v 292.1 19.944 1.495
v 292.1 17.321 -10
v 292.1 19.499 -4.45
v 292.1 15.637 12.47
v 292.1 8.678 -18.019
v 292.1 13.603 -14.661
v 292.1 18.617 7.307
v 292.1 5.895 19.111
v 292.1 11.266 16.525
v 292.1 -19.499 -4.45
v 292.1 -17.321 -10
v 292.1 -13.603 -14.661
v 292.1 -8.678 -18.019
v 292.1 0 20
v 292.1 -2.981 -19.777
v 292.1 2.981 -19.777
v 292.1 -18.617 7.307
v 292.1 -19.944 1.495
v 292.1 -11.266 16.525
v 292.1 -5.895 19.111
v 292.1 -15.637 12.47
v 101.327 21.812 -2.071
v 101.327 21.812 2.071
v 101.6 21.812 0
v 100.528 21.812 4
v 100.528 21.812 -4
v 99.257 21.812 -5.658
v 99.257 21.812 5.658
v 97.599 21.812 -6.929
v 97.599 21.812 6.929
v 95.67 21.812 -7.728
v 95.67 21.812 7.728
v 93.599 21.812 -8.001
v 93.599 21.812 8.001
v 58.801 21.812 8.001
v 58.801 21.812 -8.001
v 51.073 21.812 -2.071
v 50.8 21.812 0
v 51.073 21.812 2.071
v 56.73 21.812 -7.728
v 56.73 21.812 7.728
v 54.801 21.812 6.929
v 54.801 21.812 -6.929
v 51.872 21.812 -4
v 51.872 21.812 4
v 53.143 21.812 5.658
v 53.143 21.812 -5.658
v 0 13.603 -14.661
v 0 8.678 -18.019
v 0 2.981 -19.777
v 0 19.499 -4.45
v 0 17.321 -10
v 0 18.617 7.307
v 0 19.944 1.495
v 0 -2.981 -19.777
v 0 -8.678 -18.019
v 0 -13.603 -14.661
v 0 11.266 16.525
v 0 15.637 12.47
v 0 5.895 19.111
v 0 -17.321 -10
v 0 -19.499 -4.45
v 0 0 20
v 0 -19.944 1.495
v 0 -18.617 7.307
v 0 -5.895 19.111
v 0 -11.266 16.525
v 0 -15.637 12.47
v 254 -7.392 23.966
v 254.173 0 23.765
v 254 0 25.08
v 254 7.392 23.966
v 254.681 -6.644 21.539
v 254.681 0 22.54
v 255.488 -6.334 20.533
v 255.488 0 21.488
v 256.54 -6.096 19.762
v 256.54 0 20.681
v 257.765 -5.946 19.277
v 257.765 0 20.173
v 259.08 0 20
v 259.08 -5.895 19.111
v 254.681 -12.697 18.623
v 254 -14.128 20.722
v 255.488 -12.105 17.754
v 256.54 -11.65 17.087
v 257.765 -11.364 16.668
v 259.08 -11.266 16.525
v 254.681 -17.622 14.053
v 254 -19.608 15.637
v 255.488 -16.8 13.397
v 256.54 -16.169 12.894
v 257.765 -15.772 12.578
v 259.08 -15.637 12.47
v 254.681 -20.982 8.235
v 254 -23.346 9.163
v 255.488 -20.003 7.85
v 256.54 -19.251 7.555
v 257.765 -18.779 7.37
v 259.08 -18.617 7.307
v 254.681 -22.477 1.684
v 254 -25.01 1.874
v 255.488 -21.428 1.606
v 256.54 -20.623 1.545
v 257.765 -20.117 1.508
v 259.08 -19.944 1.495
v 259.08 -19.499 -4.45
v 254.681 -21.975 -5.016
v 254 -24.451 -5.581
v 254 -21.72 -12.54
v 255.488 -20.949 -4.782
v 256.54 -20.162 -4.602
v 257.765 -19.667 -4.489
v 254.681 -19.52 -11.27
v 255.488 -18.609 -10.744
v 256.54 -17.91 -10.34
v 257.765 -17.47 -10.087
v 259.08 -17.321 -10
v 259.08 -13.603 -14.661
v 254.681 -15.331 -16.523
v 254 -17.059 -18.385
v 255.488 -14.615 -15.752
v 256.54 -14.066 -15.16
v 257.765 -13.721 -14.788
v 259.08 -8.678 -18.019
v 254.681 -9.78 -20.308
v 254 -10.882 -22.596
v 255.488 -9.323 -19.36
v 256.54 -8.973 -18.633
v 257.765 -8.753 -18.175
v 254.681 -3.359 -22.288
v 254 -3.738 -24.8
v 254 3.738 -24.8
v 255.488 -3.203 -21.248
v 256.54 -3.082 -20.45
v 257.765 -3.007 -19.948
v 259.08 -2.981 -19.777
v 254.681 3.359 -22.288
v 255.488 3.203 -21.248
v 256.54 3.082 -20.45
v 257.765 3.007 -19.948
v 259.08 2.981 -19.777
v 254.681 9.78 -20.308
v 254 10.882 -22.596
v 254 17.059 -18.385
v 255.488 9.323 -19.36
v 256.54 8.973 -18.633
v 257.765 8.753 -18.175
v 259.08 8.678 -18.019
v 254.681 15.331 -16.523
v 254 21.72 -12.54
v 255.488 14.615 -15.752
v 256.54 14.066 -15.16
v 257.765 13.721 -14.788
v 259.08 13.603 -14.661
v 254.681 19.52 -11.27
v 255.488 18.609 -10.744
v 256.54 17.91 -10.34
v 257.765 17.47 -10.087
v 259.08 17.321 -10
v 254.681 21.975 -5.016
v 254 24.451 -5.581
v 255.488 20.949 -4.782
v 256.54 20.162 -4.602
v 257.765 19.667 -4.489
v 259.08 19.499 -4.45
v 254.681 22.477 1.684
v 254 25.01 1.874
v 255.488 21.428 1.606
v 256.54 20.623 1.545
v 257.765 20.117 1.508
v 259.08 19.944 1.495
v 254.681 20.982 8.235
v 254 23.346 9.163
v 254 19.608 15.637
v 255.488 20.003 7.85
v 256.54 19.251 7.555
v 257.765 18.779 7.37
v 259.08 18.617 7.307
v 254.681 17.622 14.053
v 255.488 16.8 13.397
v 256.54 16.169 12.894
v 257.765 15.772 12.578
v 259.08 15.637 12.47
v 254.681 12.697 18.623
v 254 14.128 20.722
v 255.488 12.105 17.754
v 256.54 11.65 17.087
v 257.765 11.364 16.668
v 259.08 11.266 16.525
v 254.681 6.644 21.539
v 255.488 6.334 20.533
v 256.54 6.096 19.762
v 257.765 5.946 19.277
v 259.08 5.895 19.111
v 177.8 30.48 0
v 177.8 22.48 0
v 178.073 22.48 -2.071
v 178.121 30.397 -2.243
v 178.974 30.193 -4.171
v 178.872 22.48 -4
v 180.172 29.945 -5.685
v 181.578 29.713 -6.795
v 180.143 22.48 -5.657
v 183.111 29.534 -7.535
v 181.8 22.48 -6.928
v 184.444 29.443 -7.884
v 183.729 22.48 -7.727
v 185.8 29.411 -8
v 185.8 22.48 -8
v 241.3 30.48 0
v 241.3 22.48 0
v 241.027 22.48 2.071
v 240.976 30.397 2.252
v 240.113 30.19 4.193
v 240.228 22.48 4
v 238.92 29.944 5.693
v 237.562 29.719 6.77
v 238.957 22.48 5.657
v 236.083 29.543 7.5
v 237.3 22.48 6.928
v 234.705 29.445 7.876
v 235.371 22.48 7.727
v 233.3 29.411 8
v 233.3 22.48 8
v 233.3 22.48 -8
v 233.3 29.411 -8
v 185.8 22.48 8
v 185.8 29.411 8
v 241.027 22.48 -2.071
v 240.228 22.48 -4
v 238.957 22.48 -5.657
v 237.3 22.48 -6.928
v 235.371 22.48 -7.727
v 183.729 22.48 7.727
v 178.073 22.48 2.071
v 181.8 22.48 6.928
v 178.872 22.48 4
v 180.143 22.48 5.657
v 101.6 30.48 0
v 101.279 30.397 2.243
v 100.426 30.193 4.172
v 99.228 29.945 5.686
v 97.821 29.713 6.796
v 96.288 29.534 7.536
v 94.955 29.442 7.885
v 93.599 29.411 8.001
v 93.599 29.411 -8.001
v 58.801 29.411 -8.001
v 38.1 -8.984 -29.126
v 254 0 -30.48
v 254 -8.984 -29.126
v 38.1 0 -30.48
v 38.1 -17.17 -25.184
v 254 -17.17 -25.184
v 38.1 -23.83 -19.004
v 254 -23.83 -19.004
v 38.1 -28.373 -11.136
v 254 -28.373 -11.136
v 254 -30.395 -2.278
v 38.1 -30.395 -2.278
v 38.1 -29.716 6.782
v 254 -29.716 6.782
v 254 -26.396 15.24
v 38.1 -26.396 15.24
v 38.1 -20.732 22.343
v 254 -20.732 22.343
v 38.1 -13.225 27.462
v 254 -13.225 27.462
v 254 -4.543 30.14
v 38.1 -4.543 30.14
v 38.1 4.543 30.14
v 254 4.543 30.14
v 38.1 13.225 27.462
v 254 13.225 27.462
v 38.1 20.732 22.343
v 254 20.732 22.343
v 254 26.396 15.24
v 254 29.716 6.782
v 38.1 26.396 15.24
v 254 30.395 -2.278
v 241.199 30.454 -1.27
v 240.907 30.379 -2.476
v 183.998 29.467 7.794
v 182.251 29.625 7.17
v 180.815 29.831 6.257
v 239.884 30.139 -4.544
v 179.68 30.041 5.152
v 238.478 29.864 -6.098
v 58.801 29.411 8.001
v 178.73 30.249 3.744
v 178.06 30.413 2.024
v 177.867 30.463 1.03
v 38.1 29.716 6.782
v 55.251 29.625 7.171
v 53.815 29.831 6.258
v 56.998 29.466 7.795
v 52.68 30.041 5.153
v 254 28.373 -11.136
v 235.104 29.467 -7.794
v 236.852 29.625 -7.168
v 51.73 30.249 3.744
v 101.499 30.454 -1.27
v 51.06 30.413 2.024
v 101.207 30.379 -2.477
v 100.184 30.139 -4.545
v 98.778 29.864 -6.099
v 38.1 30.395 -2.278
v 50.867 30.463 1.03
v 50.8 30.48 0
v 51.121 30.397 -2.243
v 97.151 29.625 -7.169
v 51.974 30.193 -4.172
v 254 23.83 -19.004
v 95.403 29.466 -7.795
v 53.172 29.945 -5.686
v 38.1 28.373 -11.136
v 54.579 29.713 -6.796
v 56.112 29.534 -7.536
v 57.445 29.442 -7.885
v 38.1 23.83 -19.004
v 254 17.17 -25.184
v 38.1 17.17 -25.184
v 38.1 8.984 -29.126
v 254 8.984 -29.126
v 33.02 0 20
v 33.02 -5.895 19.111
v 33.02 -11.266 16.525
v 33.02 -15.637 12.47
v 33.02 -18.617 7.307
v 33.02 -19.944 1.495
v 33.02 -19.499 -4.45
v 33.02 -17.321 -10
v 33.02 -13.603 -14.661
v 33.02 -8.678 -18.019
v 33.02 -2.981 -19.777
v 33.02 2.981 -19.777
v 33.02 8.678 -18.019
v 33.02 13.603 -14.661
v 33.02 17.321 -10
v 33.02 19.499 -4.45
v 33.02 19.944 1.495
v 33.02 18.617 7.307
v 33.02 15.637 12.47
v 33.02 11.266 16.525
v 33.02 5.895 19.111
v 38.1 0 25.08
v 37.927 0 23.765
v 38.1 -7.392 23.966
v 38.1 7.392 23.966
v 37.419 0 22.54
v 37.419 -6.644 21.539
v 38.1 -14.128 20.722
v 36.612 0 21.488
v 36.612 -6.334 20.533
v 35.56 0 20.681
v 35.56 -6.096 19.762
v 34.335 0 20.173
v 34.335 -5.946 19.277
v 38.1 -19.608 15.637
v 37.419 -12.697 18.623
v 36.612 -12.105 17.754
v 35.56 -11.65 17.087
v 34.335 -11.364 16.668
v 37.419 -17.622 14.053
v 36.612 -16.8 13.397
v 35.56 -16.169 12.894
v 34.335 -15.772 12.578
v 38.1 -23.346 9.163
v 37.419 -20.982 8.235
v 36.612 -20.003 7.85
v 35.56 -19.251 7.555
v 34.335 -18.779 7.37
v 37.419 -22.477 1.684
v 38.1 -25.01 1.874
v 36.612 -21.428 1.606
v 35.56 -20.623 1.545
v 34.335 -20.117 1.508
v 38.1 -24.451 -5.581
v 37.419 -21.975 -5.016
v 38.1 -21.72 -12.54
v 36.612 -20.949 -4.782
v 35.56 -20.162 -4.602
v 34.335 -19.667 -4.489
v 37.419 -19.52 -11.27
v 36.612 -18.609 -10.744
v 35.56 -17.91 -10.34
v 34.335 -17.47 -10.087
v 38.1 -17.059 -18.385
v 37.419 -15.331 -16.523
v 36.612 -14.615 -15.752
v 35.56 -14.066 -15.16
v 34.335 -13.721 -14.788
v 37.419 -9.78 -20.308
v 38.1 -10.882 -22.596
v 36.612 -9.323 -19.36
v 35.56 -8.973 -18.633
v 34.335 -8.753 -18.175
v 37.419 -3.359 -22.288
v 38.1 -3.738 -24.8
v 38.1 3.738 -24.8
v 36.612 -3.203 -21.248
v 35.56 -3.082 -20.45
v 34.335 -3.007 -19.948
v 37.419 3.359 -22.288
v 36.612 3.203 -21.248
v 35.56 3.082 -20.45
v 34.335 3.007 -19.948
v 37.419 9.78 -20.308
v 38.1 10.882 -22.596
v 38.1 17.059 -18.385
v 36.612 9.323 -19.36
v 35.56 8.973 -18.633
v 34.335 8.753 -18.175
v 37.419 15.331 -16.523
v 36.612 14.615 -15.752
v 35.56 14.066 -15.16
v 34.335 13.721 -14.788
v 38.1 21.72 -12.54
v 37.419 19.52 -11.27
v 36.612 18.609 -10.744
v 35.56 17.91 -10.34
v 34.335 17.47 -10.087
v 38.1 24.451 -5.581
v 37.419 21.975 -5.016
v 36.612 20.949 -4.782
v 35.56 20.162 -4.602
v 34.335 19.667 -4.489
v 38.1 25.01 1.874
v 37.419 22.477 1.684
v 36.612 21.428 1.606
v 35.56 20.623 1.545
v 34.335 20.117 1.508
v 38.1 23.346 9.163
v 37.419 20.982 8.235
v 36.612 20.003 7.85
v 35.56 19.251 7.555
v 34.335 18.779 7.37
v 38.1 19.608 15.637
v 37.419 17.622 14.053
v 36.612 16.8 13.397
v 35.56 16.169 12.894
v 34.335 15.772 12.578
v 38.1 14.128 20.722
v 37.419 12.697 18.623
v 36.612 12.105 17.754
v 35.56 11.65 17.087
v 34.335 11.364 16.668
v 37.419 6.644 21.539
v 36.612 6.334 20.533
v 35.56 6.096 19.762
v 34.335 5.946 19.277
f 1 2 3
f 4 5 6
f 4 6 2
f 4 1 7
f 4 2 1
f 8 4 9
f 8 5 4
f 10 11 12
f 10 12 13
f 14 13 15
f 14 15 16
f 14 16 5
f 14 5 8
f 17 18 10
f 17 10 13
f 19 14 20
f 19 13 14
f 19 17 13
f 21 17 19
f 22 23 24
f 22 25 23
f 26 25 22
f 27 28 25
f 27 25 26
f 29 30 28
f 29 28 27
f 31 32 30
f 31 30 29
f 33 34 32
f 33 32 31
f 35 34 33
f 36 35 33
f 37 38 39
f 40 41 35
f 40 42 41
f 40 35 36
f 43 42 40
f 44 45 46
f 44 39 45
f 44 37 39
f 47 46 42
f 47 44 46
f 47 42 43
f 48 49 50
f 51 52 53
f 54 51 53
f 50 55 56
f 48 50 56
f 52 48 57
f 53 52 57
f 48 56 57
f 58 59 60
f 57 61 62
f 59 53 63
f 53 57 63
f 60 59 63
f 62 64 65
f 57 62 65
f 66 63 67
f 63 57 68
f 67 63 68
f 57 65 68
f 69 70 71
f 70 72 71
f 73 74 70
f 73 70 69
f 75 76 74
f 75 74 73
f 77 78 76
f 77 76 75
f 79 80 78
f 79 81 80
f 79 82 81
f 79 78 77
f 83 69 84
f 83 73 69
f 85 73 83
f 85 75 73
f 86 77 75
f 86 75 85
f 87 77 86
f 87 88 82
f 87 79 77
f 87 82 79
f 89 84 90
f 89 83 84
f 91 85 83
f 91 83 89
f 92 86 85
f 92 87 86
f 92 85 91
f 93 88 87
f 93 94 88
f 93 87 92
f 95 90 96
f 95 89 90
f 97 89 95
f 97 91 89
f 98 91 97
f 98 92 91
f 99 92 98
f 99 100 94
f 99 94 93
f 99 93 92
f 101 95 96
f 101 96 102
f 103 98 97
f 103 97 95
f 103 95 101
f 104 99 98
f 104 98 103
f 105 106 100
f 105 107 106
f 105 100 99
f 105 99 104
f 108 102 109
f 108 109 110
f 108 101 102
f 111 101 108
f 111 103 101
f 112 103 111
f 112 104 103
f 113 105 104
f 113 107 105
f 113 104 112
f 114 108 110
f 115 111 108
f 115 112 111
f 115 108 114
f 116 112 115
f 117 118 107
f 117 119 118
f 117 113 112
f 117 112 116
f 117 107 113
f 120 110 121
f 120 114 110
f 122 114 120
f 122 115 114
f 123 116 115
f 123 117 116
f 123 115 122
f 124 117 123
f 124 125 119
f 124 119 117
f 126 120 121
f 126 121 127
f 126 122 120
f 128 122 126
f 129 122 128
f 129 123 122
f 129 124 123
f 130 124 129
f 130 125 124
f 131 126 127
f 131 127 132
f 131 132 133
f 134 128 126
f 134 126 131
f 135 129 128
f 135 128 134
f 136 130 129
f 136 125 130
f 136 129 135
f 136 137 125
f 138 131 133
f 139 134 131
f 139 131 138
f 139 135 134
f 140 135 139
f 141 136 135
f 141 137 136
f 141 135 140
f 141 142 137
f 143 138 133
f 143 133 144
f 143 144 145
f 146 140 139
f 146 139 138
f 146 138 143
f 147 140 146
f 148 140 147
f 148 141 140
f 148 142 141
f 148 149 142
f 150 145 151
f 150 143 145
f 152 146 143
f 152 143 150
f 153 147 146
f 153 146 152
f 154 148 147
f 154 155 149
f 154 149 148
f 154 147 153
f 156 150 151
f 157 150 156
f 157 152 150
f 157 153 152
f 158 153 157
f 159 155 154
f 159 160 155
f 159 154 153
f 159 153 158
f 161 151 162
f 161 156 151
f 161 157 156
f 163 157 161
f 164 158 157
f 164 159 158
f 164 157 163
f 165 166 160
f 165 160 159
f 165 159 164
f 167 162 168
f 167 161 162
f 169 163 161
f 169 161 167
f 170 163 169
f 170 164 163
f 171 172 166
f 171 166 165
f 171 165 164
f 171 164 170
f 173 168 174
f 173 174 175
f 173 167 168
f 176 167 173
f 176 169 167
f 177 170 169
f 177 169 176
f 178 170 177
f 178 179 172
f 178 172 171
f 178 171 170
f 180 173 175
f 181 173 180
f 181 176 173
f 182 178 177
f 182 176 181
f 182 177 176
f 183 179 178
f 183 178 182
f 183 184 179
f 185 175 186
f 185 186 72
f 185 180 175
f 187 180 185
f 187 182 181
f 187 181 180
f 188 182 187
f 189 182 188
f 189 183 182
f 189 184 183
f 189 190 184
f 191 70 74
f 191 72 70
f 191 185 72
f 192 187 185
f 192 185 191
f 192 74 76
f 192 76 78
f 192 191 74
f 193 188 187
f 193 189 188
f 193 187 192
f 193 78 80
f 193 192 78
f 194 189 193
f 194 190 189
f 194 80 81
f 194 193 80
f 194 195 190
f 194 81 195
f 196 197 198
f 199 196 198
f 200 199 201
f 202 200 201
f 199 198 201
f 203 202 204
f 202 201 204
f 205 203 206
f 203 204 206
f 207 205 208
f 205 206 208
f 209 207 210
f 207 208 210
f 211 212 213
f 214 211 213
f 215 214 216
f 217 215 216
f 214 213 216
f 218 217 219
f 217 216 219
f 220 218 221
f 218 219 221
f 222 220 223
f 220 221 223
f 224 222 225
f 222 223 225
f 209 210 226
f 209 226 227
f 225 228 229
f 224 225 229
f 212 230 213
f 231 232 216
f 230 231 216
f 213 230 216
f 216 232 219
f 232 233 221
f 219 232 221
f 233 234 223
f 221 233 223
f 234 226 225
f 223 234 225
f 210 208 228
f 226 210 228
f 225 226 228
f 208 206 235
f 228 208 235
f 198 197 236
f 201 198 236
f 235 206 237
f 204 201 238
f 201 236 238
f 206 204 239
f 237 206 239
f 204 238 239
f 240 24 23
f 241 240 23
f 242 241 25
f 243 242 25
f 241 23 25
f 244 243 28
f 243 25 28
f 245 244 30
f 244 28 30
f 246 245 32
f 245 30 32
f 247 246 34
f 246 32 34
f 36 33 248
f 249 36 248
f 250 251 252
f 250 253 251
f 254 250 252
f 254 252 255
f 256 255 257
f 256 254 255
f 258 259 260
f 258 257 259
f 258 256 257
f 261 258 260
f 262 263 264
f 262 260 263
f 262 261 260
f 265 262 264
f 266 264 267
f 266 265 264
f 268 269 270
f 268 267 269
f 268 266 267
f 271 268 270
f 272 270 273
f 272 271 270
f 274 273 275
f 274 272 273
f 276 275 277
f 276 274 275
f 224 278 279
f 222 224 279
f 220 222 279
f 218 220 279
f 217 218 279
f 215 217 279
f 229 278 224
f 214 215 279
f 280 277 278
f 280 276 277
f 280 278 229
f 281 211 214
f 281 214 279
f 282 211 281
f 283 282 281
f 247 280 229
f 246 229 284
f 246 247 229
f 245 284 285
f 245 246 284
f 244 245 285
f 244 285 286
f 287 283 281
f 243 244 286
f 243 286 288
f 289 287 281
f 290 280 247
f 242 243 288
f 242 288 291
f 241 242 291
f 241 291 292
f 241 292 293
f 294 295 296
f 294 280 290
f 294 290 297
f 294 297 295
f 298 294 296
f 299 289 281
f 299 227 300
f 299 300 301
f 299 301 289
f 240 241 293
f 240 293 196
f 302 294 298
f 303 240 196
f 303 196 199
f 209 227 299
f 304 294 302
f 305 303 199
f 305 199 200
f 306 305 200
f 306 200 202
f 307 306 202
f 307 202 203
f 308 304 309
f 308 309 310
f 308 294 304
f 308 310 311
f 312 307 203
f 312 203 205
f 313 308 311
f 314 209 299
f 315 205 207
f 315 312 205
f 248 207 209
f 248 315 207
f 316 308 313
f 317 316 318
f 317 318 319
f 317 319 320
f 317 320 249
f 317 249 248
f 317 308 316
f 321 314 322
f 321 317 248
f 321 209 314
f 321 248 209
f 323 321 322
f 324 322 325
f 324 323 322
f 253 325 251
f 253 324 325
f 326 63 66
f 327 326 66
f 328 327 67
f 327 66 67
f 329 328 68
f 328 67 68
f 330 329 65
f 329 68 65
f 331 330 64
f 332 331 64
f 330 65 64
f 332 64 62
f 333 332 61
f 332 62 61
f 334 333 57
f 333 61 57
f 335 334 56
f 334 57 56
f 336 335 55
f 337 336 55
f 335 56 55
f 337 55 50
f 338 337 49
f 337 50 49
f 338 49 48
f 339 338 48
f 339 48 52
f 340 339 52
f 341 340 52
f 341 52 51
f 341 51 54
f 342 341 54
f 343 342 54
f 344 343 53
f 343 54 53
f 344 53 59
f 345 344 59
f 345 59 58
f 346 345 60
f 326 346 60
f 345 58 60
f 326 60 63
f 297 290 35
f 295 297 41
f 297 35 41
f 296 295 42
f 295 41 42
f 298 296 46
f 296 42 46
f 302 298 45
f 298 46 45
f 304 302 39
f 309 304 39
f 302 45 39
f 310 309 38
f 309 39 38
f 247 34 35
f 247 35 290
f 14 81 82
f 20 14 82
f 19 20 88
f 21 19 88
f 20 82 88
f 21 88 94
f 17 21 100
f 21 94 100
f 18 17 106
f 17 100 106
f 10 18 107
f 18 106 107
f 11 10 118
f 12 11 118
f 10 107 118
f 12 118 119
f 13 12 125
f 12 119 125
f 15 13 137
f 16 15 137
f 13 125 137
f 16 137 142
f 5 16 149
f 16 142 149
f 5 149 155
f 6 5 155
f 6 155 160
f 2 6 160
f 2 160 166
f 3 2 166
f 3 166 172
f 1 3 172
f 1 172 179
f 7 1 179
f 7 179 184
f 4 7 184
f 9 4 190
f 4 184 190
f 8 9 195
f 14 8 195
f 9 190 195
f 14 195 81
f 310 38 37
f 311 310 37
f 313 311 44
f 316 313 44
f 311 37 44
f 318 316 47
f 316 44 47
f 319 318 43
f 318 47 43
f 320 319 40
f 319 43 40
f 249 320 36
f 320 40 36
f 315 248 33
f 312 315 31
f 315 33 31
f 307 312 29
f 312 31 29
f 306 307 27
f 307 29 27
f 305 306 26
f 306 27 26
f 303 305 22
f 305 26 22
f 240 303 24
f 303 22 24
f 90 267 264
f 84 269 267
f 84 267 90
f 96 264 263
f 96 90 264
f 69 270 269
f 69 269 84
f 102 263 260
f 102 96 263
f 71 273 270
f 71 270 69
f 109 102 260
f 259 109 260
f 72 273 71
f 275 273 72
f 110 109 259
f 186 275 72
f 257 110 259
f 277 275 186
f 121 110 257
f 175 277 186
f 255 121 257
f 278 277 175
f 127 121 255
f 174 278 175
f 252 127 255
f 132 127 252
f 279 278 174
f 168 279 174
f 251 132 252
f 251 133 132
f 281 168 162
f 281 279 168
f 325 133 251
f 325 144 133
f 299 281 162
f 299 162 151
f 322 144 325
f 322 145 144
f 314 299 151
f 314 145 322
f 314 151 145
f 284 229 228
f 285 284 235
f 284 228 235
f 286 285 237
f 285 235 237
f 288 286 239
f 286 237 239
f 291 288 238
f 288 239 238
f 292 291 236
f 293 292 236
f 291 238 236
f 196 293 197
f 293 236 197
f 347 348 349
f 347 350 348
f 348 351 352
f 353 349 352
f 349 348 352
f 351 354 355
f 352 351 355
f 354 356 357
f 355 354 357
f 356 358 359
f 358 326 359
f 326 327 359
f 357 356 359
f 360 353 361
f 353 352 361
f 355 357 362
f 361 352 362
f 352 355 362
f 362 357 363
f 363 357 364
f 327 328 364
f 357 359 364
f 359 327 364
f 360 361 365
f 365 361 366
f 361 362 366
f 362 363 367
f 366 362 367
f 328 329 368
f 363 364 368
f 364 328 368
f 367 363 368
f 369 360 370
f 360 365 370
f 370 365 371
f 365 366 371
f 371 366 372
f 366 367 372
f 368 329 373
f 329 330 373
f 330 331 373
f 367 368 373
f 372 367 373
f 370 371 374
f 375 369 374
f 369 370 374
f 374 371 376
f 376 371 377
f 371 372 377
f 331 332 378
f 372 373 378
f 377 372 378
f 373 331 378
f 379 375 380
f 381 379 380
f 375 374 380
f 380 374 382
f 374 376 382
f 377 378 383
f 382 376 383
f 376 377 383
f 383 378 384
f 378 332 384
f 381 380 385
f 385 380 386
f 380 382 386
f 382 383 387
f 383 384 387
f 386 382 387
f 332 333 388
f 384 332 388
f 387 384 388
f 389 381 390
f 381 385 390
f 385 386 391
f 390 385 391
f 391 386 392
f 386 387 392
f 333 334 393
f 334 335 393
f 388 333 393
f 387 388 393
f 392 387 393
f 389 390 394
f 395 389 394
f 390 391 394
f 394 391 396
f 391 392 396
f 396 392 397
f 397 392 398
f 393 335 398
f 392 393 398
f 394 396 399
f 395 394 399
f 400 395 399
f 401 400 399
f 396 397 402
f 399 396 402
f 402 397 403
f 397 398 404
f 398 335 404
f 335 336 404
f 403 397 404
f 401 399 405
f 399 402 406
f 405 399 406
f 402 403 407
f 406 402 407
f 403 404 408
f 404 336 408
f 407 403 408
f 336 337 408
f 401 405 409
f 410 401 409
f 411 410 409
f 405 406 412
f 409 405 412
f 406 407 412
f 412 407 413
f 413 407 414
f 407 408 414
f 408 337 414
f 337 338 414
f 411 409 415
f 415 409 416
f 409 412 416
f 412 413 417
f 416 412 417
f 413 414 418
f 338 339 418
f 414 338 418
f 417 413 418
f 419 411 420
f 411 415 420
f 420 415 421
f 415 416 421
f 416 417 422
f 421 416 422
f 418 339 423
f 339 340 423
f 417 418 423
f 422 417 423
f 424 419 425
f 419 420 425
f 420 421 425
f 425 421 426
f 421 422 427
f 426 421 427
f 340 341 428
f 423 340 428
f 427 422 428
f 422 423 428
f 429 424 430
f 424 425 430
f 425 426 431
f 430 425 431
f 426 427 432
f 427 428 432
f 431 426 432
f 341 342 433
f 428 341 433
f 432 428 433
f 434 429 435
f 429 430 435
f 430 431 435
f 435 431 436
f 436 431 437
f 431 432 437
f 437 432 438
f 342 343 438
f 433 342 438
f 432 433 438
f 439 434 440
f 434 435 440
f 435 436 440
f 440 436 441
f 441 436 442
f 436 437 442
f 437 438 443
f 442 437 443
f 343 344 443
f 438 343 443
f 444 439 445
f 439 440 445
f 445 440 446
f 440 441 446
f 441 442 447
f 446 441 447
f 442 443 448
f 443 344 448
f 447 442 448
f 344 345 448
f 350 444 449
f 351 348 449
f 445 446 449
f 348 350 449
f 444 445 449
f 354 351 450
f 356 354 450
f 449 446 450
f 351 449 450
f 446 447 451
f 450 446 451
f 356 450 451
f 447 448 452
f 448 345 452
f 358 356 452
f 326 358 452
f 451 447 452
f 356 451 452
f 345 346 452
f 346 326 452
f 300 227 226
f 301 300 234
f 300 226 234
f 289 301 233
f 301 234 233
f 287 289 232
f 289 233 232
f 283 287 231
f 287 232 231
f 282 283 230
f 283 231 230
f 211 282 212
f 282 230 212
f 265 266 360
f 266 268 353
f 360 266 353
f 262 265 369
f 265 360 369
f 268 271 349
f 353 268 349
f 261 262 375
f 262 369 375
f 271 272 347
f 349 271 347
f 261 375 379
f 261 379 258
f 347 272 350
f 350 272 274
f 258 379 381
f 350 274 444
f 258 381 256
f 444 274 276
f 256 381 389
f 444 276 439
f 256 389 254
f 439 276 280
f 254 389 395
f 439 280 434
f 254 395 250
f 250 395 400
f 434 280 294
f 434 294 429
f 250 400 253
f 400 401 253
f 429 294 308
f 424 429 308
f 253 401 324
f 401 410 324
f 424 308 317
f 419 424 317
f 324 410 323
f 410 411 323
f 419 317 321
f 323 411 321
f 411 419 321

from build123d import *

# Parameters (mm, degrees)
SKETCH1_R                = 20
BOSS_EXTRUDE1_DEPTH      = 38.1
SKETCH2_R                = 30.48
BOSS_EXTRUDE2_DEPTH      = 215.9
SKETCH3_R                = 19.9999981
BOSS_EXTRUDE3_DEPTH      = 38.1
FILLET1_R                = 5.08
SKETCH6_W                = 16.002
SKETCH6_H                = 16.002
CUT_EXTRUDE1_DEPTH       = 50.8
SKETCH7_W                = 16
SKETCH7_H                = 16
CUT_EXTRUDE2_DEPTH       = 63.5
BOSS_EXTRUDE4_REACH      = 300.305
BOSS_EXTRUDE4_END_RADIUS = 30.48
BOSS_EXTRUDE5_REACH      = 300.423
BOSS_EXTRUDE5_END_RADIUS = 30.48


with BuildPart() as part:
    # Sketch1 → Boss-Extrude1 (new body)
    with BuildSketch(Plane(origin=(0, 0, 0), x_dir=(0, 0, -1), z_dir=(1, 0, 0))):
        with Locations(Location((0, 0, 0), (0, 0, 180))):
            Circle(SKETCH1_R)
    extrude(amount=BOSS_EXTRUDE1_DEPTH)

    # Sketch2 → Boss-Extrude2 (add)
    with BuildSketch(Plane(origin=(38.1, 0, 0), x_dir=(0, 0, -1), z_dir=(1, 0, 0))):
        Circle(SKETCH2_R)
    extrude(amount=BOSS_EXTRUDE2_DEPTH)

    # Sketch3 → Boss-Extrude3 (add)
    with BuildSketch(Plane(origin=(254, 0, 0), x_dir=(0, 0, -1), z_dir=(1, 0, 0))):
        with Locations(Location((0, 0, 0), (0, 0, 180))):
            Circle(SKETCH3_R)
    extrude(amount=BOSS_EXTRUDE3_DEPTH)

    # Fillet1
    fillet1_edges = [part.edges().sort_by_distance(p)[0] for p in [
        (38.1, 0, -20),
        (254, 0, -19.9999981),
    ]]
    fillet(fillet1_edges, radius=FILLET1_R)

    # Sketch6 → Cut-Extrude1 (cut)
    with BuildSketch(Plane(origin=(50.8, 0, 0), x_dir=(0, 0, -1), z_dir=(1, 0, 0))):
        with Locations((0, 29.812996)):
            Rectangle(SKETCH6_W, SKETCH6_H)
    extrude(amount=CUT_EXTRUDE1_DEPTH, mode=Mode.SUBTRACT)

    # Sketch7 → Cut-Extrude2 (cut)
    with BuildSketch(Plane.ZY.offset(-177.8)):
        with Locations((0, 30.48)):
            Rectangle(SKETCH7_W, SKETCH7_H)
    extrude(amount=-CUT_EXTRUDE2_DEPTH, mode=Mode.SUBTRACT)

    # Boss-Extrude4: up to this cylinder (the profile starts inside it)
    boss_extrude4_end = Plane(origin=(76.2, 0, 0), z_dir=(-1, 0, 0)) * Cylinder(BOSS_EXTRUDE4_END_RADIUS, 709.795666, mode=Mode.PRIVATE)
    # Sketch8 → Boss-Extrude4 (add, up to the surface)
    with BuildSketch(Plane(origin=(0, 21.811996, 0), x_dir=(1, 0, 0), z_dir=(0, 1, 0)), mode=Mode.PRIVATE) as boss_extrude4_sk1:
        with BuildLine():
            Line((58.801, 8.001), (50.8, 8.001))
            Line((50.8, 8.001), (50.8, 0))
            ThreePointArc((50.8, 0), (53.143438644, 5.657561356), (58.801, 8.001))
        make_face()
    boss_extrude4_tool1 = extrude(boss_extrude4_sk1.sketch, amount=BOSS_EXTRUDE4_REACH, mode=Mode.PRIVATE) & boss_extrude4_end
    add(boss_extrude4_tool1.solids().sort_by_distance((52.587167, 21.811996, -6.213833))[0])
    # Sketch8 → Boss-Extrude4 (add, up to the surface)
    with BuildSketch(Plane(origin=(0, 21.811996, 0), x_dir=(1, 0, 0), z_dir=(0, 1, 0)), mode=Mode.PRIVATE) as boss_extrude4_sk2:
        with BuildLine():
            ThreePointArc((58.801, -8.001), (53.143438644, -5.657561356), (50.8, 0))
            Line((50.8, 0), (50.8, -8.001))
            Line((50.8, -8.001), (58.801, -8.001))
        make_face()
    boss_extrude4_tool2 = extrude(boss_extrude4_sk2.sketch, amount=BOSS_EXTRUDE4_REACH, mode=Mode.PRIVATE) & boss_extrude4_end
    add(boss_extrude4_tool2.solids().sort_by_distance((52.587167, 21.811996, 6.213833))[0])
    # Sketch8 → Boss-Extrude4 (add, up to the surface)
    with BuildSketch(Plane(origin=(0, 21.811996, 0), x_dir=(1, 0, 0), z_dir=(0, 1, 0)), mode=Mode.PRIVATE) as boss_extrude4_sk3:
        with BuildLine():
            ThreePointArc((101.6, 0), (99.256561356, -5.657561356), (93.599, -8.001))
            Line((93.599, -8.001), (101.6, -8.001))
            Line((101.6, -8.001), (101.6, 0))
        make_face()
    boss_extrude4_tool3 = extrude(boss_extrude4_sk3.sketch, amount=BOSS_EXTRUDE4_REACH, mode=Mode.PRIVATE) & boss_extrude4_end
    add(boss_extrude4_tool3.solids().sort_by_distance((99.812833, 21.811996, 6.213833))[0])
    # Sketch8 → Boss-Extrude4 (add, up to the surface)
    with BuildSketch(Plane(origin=(0, 21.811996, 0), x_dir=(1, 0, 0), z_dir=(0, 1, 0)), mode=Mode.PRIVATE) as boss_extrude4_sk4:
        with BuildLine():
            Line((101.6, 8.001), (93.599, 8.001))
            ThreePointArc((93.599, 8.001), (99.256561356, 5.657561356), (101.6, 0))
            Line((101.6, 0), (101.6, 8.001))
        make_face()
    boss_extrude4_tool4 = extrude(boss_extrude4_sk4.sketch, amount=BOSS_EXTRUDE4_REACH, mode=Mode.PRIVATE) & boss_extrude4_end
    add(boss_extrude4_tool4.solids().sort_by_distance((99.812833, 21.811996, -6.213833))[0])

    # Boss-Extrude5: up to this cylinder (the profile starts inside it)
    boss_extrude5_end = Plane(origin=(209.55, 0, 0), z_dir=(-1, 0, 0)) * Cylinder(BOSS_EXTRUDE5_END_RADIUS, 722.732112, mode=Mode.PRIVATE)
    # Sketch10 → Boss-Extrude5 (add, up to the surface)
    with BuildSketch(Plane(origin=(0, 22.48, 0), x_dir=(1, 0, 0), z_dir=(0, 1, 0)), mode=Mode.PRIVATE) as boss_extrude5_sk1:
        with BuildLine():
            ThreePointArc((177.8, 0), (180.143145751, 5.656854249), (185.8, 8))
            Line((185.8, 8), (177.8, 8))
            Line((177.8, 8), (177.8, 0))
        make_face()
    boss_extrude5_tool1 = extrude(boss_extrude5_sk1.sketch, amount=BOSS_EXTRUDE5_REACH, mode=Mode.PRIVATE) & boss_extrude5_end
    add(boss_extrude5_tool1.solids().sort_by_distance((179.586944, 22.48, -6.213056))[0])
    # Sketch10 → Boss-Extrude5 (add, up to the surface)
    with BuildSketch(Plane(origin=(0, 22.48, 0), x_dir=(1, 0, 0), z_dir=(0, 1, 0)), mode=Mode.PRIVATE) as boss_extrude5_sk2:
        with BuildLine():
            ThreePointArc((185.8, -8), (180.143145751, -5.656854249), (177.8, 0))
            Line((177.8, 0), (177.8, -8))
            Line((177.8, -8), (185.8, -8))
        make_face()
    boss_extrude5_tool2 = extrude(boss_extrude5_sk2.sketch, amount=BOSS_EXTRUDE5_REACH, mode=Mode.PRIVATE) & boss_extrude5_end
    add(boss_extrude5_tool2.solids().sort_by_distance((179.586944, 22.48, 6.213056))[0])
    # Sketch10 → Boss-Extrude5 (add, up to the surface)
    with BuildSketch(Plane(origin=(0, 22.48, 0), x_dir=(1, 0, 0), z_dir=(0, 1, 0)), mode=Mode.PRIVATE) as boss_extrude5_sk3:
        with BuildLine():
            Line((241.3, -8), (241.3, 0))
            ThreePointArc((241.3, 0), (238.956854249, -5.656854249), (233.3, -8))
            Line((233.3, -8), (241.3, -8))
        make_face()
    boss_extrude5_tool3 = extrude(boss_extrude5_sk3.sketch, amount=BOSS_EXTRUDE5_REACH, mode=Mode.PRIVATE) & boss_extrude5_end
    add(boss_extrude5_tool3.solids().sort_by_distance((239.513056, 22.48, 6.213056))[0])
    # Sketch10 → Boss-Extrude5 (add, up to the surface)
    with BuildSketch(Plane(origin=(0, 22.48, 0), x_dir=(1, 0, 0), z_dir=(0, 1, 0)), mode=Mode.PRIVATE) as boss_extrude5_sk4:
        with BuildLine():
            Line((241.3, 8), (233.3, 8))
            ThreePointArc((233.3, 8), (238.956854249, 5.656854249), (241.3, 0))
            Line((241.3, 0), (241.3, 8))
        make_face()
    boss_extrude5_tool4 = extrude(boss_extrude5_sk4.sketch, amount=BOSS_EXTRUDE5_REACH, mode=Mode.PRIVATE) & boss_extrude5_end
    add(boss_extrude5_tool4.solids().sort_by_distance((239.513056, 22.48, -6.213056))[0])


solid = part.part
